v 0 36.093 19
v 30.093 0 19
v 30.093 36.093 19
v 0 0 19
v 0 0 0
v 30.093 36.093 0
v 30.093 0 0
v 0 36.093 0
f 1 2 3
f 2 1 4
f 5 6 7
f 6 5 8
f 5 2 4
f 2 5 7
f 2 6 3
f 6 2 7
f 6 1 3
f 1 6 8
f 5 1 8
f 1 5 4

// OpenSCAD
cube([30.09336, 36.09336, 19]);
translate([1.1, 0.837, 0])
    linear_extrude(height = 23.56, convexity = 5)
        import(file = "pouceenlair.dxf", layer = "0");
